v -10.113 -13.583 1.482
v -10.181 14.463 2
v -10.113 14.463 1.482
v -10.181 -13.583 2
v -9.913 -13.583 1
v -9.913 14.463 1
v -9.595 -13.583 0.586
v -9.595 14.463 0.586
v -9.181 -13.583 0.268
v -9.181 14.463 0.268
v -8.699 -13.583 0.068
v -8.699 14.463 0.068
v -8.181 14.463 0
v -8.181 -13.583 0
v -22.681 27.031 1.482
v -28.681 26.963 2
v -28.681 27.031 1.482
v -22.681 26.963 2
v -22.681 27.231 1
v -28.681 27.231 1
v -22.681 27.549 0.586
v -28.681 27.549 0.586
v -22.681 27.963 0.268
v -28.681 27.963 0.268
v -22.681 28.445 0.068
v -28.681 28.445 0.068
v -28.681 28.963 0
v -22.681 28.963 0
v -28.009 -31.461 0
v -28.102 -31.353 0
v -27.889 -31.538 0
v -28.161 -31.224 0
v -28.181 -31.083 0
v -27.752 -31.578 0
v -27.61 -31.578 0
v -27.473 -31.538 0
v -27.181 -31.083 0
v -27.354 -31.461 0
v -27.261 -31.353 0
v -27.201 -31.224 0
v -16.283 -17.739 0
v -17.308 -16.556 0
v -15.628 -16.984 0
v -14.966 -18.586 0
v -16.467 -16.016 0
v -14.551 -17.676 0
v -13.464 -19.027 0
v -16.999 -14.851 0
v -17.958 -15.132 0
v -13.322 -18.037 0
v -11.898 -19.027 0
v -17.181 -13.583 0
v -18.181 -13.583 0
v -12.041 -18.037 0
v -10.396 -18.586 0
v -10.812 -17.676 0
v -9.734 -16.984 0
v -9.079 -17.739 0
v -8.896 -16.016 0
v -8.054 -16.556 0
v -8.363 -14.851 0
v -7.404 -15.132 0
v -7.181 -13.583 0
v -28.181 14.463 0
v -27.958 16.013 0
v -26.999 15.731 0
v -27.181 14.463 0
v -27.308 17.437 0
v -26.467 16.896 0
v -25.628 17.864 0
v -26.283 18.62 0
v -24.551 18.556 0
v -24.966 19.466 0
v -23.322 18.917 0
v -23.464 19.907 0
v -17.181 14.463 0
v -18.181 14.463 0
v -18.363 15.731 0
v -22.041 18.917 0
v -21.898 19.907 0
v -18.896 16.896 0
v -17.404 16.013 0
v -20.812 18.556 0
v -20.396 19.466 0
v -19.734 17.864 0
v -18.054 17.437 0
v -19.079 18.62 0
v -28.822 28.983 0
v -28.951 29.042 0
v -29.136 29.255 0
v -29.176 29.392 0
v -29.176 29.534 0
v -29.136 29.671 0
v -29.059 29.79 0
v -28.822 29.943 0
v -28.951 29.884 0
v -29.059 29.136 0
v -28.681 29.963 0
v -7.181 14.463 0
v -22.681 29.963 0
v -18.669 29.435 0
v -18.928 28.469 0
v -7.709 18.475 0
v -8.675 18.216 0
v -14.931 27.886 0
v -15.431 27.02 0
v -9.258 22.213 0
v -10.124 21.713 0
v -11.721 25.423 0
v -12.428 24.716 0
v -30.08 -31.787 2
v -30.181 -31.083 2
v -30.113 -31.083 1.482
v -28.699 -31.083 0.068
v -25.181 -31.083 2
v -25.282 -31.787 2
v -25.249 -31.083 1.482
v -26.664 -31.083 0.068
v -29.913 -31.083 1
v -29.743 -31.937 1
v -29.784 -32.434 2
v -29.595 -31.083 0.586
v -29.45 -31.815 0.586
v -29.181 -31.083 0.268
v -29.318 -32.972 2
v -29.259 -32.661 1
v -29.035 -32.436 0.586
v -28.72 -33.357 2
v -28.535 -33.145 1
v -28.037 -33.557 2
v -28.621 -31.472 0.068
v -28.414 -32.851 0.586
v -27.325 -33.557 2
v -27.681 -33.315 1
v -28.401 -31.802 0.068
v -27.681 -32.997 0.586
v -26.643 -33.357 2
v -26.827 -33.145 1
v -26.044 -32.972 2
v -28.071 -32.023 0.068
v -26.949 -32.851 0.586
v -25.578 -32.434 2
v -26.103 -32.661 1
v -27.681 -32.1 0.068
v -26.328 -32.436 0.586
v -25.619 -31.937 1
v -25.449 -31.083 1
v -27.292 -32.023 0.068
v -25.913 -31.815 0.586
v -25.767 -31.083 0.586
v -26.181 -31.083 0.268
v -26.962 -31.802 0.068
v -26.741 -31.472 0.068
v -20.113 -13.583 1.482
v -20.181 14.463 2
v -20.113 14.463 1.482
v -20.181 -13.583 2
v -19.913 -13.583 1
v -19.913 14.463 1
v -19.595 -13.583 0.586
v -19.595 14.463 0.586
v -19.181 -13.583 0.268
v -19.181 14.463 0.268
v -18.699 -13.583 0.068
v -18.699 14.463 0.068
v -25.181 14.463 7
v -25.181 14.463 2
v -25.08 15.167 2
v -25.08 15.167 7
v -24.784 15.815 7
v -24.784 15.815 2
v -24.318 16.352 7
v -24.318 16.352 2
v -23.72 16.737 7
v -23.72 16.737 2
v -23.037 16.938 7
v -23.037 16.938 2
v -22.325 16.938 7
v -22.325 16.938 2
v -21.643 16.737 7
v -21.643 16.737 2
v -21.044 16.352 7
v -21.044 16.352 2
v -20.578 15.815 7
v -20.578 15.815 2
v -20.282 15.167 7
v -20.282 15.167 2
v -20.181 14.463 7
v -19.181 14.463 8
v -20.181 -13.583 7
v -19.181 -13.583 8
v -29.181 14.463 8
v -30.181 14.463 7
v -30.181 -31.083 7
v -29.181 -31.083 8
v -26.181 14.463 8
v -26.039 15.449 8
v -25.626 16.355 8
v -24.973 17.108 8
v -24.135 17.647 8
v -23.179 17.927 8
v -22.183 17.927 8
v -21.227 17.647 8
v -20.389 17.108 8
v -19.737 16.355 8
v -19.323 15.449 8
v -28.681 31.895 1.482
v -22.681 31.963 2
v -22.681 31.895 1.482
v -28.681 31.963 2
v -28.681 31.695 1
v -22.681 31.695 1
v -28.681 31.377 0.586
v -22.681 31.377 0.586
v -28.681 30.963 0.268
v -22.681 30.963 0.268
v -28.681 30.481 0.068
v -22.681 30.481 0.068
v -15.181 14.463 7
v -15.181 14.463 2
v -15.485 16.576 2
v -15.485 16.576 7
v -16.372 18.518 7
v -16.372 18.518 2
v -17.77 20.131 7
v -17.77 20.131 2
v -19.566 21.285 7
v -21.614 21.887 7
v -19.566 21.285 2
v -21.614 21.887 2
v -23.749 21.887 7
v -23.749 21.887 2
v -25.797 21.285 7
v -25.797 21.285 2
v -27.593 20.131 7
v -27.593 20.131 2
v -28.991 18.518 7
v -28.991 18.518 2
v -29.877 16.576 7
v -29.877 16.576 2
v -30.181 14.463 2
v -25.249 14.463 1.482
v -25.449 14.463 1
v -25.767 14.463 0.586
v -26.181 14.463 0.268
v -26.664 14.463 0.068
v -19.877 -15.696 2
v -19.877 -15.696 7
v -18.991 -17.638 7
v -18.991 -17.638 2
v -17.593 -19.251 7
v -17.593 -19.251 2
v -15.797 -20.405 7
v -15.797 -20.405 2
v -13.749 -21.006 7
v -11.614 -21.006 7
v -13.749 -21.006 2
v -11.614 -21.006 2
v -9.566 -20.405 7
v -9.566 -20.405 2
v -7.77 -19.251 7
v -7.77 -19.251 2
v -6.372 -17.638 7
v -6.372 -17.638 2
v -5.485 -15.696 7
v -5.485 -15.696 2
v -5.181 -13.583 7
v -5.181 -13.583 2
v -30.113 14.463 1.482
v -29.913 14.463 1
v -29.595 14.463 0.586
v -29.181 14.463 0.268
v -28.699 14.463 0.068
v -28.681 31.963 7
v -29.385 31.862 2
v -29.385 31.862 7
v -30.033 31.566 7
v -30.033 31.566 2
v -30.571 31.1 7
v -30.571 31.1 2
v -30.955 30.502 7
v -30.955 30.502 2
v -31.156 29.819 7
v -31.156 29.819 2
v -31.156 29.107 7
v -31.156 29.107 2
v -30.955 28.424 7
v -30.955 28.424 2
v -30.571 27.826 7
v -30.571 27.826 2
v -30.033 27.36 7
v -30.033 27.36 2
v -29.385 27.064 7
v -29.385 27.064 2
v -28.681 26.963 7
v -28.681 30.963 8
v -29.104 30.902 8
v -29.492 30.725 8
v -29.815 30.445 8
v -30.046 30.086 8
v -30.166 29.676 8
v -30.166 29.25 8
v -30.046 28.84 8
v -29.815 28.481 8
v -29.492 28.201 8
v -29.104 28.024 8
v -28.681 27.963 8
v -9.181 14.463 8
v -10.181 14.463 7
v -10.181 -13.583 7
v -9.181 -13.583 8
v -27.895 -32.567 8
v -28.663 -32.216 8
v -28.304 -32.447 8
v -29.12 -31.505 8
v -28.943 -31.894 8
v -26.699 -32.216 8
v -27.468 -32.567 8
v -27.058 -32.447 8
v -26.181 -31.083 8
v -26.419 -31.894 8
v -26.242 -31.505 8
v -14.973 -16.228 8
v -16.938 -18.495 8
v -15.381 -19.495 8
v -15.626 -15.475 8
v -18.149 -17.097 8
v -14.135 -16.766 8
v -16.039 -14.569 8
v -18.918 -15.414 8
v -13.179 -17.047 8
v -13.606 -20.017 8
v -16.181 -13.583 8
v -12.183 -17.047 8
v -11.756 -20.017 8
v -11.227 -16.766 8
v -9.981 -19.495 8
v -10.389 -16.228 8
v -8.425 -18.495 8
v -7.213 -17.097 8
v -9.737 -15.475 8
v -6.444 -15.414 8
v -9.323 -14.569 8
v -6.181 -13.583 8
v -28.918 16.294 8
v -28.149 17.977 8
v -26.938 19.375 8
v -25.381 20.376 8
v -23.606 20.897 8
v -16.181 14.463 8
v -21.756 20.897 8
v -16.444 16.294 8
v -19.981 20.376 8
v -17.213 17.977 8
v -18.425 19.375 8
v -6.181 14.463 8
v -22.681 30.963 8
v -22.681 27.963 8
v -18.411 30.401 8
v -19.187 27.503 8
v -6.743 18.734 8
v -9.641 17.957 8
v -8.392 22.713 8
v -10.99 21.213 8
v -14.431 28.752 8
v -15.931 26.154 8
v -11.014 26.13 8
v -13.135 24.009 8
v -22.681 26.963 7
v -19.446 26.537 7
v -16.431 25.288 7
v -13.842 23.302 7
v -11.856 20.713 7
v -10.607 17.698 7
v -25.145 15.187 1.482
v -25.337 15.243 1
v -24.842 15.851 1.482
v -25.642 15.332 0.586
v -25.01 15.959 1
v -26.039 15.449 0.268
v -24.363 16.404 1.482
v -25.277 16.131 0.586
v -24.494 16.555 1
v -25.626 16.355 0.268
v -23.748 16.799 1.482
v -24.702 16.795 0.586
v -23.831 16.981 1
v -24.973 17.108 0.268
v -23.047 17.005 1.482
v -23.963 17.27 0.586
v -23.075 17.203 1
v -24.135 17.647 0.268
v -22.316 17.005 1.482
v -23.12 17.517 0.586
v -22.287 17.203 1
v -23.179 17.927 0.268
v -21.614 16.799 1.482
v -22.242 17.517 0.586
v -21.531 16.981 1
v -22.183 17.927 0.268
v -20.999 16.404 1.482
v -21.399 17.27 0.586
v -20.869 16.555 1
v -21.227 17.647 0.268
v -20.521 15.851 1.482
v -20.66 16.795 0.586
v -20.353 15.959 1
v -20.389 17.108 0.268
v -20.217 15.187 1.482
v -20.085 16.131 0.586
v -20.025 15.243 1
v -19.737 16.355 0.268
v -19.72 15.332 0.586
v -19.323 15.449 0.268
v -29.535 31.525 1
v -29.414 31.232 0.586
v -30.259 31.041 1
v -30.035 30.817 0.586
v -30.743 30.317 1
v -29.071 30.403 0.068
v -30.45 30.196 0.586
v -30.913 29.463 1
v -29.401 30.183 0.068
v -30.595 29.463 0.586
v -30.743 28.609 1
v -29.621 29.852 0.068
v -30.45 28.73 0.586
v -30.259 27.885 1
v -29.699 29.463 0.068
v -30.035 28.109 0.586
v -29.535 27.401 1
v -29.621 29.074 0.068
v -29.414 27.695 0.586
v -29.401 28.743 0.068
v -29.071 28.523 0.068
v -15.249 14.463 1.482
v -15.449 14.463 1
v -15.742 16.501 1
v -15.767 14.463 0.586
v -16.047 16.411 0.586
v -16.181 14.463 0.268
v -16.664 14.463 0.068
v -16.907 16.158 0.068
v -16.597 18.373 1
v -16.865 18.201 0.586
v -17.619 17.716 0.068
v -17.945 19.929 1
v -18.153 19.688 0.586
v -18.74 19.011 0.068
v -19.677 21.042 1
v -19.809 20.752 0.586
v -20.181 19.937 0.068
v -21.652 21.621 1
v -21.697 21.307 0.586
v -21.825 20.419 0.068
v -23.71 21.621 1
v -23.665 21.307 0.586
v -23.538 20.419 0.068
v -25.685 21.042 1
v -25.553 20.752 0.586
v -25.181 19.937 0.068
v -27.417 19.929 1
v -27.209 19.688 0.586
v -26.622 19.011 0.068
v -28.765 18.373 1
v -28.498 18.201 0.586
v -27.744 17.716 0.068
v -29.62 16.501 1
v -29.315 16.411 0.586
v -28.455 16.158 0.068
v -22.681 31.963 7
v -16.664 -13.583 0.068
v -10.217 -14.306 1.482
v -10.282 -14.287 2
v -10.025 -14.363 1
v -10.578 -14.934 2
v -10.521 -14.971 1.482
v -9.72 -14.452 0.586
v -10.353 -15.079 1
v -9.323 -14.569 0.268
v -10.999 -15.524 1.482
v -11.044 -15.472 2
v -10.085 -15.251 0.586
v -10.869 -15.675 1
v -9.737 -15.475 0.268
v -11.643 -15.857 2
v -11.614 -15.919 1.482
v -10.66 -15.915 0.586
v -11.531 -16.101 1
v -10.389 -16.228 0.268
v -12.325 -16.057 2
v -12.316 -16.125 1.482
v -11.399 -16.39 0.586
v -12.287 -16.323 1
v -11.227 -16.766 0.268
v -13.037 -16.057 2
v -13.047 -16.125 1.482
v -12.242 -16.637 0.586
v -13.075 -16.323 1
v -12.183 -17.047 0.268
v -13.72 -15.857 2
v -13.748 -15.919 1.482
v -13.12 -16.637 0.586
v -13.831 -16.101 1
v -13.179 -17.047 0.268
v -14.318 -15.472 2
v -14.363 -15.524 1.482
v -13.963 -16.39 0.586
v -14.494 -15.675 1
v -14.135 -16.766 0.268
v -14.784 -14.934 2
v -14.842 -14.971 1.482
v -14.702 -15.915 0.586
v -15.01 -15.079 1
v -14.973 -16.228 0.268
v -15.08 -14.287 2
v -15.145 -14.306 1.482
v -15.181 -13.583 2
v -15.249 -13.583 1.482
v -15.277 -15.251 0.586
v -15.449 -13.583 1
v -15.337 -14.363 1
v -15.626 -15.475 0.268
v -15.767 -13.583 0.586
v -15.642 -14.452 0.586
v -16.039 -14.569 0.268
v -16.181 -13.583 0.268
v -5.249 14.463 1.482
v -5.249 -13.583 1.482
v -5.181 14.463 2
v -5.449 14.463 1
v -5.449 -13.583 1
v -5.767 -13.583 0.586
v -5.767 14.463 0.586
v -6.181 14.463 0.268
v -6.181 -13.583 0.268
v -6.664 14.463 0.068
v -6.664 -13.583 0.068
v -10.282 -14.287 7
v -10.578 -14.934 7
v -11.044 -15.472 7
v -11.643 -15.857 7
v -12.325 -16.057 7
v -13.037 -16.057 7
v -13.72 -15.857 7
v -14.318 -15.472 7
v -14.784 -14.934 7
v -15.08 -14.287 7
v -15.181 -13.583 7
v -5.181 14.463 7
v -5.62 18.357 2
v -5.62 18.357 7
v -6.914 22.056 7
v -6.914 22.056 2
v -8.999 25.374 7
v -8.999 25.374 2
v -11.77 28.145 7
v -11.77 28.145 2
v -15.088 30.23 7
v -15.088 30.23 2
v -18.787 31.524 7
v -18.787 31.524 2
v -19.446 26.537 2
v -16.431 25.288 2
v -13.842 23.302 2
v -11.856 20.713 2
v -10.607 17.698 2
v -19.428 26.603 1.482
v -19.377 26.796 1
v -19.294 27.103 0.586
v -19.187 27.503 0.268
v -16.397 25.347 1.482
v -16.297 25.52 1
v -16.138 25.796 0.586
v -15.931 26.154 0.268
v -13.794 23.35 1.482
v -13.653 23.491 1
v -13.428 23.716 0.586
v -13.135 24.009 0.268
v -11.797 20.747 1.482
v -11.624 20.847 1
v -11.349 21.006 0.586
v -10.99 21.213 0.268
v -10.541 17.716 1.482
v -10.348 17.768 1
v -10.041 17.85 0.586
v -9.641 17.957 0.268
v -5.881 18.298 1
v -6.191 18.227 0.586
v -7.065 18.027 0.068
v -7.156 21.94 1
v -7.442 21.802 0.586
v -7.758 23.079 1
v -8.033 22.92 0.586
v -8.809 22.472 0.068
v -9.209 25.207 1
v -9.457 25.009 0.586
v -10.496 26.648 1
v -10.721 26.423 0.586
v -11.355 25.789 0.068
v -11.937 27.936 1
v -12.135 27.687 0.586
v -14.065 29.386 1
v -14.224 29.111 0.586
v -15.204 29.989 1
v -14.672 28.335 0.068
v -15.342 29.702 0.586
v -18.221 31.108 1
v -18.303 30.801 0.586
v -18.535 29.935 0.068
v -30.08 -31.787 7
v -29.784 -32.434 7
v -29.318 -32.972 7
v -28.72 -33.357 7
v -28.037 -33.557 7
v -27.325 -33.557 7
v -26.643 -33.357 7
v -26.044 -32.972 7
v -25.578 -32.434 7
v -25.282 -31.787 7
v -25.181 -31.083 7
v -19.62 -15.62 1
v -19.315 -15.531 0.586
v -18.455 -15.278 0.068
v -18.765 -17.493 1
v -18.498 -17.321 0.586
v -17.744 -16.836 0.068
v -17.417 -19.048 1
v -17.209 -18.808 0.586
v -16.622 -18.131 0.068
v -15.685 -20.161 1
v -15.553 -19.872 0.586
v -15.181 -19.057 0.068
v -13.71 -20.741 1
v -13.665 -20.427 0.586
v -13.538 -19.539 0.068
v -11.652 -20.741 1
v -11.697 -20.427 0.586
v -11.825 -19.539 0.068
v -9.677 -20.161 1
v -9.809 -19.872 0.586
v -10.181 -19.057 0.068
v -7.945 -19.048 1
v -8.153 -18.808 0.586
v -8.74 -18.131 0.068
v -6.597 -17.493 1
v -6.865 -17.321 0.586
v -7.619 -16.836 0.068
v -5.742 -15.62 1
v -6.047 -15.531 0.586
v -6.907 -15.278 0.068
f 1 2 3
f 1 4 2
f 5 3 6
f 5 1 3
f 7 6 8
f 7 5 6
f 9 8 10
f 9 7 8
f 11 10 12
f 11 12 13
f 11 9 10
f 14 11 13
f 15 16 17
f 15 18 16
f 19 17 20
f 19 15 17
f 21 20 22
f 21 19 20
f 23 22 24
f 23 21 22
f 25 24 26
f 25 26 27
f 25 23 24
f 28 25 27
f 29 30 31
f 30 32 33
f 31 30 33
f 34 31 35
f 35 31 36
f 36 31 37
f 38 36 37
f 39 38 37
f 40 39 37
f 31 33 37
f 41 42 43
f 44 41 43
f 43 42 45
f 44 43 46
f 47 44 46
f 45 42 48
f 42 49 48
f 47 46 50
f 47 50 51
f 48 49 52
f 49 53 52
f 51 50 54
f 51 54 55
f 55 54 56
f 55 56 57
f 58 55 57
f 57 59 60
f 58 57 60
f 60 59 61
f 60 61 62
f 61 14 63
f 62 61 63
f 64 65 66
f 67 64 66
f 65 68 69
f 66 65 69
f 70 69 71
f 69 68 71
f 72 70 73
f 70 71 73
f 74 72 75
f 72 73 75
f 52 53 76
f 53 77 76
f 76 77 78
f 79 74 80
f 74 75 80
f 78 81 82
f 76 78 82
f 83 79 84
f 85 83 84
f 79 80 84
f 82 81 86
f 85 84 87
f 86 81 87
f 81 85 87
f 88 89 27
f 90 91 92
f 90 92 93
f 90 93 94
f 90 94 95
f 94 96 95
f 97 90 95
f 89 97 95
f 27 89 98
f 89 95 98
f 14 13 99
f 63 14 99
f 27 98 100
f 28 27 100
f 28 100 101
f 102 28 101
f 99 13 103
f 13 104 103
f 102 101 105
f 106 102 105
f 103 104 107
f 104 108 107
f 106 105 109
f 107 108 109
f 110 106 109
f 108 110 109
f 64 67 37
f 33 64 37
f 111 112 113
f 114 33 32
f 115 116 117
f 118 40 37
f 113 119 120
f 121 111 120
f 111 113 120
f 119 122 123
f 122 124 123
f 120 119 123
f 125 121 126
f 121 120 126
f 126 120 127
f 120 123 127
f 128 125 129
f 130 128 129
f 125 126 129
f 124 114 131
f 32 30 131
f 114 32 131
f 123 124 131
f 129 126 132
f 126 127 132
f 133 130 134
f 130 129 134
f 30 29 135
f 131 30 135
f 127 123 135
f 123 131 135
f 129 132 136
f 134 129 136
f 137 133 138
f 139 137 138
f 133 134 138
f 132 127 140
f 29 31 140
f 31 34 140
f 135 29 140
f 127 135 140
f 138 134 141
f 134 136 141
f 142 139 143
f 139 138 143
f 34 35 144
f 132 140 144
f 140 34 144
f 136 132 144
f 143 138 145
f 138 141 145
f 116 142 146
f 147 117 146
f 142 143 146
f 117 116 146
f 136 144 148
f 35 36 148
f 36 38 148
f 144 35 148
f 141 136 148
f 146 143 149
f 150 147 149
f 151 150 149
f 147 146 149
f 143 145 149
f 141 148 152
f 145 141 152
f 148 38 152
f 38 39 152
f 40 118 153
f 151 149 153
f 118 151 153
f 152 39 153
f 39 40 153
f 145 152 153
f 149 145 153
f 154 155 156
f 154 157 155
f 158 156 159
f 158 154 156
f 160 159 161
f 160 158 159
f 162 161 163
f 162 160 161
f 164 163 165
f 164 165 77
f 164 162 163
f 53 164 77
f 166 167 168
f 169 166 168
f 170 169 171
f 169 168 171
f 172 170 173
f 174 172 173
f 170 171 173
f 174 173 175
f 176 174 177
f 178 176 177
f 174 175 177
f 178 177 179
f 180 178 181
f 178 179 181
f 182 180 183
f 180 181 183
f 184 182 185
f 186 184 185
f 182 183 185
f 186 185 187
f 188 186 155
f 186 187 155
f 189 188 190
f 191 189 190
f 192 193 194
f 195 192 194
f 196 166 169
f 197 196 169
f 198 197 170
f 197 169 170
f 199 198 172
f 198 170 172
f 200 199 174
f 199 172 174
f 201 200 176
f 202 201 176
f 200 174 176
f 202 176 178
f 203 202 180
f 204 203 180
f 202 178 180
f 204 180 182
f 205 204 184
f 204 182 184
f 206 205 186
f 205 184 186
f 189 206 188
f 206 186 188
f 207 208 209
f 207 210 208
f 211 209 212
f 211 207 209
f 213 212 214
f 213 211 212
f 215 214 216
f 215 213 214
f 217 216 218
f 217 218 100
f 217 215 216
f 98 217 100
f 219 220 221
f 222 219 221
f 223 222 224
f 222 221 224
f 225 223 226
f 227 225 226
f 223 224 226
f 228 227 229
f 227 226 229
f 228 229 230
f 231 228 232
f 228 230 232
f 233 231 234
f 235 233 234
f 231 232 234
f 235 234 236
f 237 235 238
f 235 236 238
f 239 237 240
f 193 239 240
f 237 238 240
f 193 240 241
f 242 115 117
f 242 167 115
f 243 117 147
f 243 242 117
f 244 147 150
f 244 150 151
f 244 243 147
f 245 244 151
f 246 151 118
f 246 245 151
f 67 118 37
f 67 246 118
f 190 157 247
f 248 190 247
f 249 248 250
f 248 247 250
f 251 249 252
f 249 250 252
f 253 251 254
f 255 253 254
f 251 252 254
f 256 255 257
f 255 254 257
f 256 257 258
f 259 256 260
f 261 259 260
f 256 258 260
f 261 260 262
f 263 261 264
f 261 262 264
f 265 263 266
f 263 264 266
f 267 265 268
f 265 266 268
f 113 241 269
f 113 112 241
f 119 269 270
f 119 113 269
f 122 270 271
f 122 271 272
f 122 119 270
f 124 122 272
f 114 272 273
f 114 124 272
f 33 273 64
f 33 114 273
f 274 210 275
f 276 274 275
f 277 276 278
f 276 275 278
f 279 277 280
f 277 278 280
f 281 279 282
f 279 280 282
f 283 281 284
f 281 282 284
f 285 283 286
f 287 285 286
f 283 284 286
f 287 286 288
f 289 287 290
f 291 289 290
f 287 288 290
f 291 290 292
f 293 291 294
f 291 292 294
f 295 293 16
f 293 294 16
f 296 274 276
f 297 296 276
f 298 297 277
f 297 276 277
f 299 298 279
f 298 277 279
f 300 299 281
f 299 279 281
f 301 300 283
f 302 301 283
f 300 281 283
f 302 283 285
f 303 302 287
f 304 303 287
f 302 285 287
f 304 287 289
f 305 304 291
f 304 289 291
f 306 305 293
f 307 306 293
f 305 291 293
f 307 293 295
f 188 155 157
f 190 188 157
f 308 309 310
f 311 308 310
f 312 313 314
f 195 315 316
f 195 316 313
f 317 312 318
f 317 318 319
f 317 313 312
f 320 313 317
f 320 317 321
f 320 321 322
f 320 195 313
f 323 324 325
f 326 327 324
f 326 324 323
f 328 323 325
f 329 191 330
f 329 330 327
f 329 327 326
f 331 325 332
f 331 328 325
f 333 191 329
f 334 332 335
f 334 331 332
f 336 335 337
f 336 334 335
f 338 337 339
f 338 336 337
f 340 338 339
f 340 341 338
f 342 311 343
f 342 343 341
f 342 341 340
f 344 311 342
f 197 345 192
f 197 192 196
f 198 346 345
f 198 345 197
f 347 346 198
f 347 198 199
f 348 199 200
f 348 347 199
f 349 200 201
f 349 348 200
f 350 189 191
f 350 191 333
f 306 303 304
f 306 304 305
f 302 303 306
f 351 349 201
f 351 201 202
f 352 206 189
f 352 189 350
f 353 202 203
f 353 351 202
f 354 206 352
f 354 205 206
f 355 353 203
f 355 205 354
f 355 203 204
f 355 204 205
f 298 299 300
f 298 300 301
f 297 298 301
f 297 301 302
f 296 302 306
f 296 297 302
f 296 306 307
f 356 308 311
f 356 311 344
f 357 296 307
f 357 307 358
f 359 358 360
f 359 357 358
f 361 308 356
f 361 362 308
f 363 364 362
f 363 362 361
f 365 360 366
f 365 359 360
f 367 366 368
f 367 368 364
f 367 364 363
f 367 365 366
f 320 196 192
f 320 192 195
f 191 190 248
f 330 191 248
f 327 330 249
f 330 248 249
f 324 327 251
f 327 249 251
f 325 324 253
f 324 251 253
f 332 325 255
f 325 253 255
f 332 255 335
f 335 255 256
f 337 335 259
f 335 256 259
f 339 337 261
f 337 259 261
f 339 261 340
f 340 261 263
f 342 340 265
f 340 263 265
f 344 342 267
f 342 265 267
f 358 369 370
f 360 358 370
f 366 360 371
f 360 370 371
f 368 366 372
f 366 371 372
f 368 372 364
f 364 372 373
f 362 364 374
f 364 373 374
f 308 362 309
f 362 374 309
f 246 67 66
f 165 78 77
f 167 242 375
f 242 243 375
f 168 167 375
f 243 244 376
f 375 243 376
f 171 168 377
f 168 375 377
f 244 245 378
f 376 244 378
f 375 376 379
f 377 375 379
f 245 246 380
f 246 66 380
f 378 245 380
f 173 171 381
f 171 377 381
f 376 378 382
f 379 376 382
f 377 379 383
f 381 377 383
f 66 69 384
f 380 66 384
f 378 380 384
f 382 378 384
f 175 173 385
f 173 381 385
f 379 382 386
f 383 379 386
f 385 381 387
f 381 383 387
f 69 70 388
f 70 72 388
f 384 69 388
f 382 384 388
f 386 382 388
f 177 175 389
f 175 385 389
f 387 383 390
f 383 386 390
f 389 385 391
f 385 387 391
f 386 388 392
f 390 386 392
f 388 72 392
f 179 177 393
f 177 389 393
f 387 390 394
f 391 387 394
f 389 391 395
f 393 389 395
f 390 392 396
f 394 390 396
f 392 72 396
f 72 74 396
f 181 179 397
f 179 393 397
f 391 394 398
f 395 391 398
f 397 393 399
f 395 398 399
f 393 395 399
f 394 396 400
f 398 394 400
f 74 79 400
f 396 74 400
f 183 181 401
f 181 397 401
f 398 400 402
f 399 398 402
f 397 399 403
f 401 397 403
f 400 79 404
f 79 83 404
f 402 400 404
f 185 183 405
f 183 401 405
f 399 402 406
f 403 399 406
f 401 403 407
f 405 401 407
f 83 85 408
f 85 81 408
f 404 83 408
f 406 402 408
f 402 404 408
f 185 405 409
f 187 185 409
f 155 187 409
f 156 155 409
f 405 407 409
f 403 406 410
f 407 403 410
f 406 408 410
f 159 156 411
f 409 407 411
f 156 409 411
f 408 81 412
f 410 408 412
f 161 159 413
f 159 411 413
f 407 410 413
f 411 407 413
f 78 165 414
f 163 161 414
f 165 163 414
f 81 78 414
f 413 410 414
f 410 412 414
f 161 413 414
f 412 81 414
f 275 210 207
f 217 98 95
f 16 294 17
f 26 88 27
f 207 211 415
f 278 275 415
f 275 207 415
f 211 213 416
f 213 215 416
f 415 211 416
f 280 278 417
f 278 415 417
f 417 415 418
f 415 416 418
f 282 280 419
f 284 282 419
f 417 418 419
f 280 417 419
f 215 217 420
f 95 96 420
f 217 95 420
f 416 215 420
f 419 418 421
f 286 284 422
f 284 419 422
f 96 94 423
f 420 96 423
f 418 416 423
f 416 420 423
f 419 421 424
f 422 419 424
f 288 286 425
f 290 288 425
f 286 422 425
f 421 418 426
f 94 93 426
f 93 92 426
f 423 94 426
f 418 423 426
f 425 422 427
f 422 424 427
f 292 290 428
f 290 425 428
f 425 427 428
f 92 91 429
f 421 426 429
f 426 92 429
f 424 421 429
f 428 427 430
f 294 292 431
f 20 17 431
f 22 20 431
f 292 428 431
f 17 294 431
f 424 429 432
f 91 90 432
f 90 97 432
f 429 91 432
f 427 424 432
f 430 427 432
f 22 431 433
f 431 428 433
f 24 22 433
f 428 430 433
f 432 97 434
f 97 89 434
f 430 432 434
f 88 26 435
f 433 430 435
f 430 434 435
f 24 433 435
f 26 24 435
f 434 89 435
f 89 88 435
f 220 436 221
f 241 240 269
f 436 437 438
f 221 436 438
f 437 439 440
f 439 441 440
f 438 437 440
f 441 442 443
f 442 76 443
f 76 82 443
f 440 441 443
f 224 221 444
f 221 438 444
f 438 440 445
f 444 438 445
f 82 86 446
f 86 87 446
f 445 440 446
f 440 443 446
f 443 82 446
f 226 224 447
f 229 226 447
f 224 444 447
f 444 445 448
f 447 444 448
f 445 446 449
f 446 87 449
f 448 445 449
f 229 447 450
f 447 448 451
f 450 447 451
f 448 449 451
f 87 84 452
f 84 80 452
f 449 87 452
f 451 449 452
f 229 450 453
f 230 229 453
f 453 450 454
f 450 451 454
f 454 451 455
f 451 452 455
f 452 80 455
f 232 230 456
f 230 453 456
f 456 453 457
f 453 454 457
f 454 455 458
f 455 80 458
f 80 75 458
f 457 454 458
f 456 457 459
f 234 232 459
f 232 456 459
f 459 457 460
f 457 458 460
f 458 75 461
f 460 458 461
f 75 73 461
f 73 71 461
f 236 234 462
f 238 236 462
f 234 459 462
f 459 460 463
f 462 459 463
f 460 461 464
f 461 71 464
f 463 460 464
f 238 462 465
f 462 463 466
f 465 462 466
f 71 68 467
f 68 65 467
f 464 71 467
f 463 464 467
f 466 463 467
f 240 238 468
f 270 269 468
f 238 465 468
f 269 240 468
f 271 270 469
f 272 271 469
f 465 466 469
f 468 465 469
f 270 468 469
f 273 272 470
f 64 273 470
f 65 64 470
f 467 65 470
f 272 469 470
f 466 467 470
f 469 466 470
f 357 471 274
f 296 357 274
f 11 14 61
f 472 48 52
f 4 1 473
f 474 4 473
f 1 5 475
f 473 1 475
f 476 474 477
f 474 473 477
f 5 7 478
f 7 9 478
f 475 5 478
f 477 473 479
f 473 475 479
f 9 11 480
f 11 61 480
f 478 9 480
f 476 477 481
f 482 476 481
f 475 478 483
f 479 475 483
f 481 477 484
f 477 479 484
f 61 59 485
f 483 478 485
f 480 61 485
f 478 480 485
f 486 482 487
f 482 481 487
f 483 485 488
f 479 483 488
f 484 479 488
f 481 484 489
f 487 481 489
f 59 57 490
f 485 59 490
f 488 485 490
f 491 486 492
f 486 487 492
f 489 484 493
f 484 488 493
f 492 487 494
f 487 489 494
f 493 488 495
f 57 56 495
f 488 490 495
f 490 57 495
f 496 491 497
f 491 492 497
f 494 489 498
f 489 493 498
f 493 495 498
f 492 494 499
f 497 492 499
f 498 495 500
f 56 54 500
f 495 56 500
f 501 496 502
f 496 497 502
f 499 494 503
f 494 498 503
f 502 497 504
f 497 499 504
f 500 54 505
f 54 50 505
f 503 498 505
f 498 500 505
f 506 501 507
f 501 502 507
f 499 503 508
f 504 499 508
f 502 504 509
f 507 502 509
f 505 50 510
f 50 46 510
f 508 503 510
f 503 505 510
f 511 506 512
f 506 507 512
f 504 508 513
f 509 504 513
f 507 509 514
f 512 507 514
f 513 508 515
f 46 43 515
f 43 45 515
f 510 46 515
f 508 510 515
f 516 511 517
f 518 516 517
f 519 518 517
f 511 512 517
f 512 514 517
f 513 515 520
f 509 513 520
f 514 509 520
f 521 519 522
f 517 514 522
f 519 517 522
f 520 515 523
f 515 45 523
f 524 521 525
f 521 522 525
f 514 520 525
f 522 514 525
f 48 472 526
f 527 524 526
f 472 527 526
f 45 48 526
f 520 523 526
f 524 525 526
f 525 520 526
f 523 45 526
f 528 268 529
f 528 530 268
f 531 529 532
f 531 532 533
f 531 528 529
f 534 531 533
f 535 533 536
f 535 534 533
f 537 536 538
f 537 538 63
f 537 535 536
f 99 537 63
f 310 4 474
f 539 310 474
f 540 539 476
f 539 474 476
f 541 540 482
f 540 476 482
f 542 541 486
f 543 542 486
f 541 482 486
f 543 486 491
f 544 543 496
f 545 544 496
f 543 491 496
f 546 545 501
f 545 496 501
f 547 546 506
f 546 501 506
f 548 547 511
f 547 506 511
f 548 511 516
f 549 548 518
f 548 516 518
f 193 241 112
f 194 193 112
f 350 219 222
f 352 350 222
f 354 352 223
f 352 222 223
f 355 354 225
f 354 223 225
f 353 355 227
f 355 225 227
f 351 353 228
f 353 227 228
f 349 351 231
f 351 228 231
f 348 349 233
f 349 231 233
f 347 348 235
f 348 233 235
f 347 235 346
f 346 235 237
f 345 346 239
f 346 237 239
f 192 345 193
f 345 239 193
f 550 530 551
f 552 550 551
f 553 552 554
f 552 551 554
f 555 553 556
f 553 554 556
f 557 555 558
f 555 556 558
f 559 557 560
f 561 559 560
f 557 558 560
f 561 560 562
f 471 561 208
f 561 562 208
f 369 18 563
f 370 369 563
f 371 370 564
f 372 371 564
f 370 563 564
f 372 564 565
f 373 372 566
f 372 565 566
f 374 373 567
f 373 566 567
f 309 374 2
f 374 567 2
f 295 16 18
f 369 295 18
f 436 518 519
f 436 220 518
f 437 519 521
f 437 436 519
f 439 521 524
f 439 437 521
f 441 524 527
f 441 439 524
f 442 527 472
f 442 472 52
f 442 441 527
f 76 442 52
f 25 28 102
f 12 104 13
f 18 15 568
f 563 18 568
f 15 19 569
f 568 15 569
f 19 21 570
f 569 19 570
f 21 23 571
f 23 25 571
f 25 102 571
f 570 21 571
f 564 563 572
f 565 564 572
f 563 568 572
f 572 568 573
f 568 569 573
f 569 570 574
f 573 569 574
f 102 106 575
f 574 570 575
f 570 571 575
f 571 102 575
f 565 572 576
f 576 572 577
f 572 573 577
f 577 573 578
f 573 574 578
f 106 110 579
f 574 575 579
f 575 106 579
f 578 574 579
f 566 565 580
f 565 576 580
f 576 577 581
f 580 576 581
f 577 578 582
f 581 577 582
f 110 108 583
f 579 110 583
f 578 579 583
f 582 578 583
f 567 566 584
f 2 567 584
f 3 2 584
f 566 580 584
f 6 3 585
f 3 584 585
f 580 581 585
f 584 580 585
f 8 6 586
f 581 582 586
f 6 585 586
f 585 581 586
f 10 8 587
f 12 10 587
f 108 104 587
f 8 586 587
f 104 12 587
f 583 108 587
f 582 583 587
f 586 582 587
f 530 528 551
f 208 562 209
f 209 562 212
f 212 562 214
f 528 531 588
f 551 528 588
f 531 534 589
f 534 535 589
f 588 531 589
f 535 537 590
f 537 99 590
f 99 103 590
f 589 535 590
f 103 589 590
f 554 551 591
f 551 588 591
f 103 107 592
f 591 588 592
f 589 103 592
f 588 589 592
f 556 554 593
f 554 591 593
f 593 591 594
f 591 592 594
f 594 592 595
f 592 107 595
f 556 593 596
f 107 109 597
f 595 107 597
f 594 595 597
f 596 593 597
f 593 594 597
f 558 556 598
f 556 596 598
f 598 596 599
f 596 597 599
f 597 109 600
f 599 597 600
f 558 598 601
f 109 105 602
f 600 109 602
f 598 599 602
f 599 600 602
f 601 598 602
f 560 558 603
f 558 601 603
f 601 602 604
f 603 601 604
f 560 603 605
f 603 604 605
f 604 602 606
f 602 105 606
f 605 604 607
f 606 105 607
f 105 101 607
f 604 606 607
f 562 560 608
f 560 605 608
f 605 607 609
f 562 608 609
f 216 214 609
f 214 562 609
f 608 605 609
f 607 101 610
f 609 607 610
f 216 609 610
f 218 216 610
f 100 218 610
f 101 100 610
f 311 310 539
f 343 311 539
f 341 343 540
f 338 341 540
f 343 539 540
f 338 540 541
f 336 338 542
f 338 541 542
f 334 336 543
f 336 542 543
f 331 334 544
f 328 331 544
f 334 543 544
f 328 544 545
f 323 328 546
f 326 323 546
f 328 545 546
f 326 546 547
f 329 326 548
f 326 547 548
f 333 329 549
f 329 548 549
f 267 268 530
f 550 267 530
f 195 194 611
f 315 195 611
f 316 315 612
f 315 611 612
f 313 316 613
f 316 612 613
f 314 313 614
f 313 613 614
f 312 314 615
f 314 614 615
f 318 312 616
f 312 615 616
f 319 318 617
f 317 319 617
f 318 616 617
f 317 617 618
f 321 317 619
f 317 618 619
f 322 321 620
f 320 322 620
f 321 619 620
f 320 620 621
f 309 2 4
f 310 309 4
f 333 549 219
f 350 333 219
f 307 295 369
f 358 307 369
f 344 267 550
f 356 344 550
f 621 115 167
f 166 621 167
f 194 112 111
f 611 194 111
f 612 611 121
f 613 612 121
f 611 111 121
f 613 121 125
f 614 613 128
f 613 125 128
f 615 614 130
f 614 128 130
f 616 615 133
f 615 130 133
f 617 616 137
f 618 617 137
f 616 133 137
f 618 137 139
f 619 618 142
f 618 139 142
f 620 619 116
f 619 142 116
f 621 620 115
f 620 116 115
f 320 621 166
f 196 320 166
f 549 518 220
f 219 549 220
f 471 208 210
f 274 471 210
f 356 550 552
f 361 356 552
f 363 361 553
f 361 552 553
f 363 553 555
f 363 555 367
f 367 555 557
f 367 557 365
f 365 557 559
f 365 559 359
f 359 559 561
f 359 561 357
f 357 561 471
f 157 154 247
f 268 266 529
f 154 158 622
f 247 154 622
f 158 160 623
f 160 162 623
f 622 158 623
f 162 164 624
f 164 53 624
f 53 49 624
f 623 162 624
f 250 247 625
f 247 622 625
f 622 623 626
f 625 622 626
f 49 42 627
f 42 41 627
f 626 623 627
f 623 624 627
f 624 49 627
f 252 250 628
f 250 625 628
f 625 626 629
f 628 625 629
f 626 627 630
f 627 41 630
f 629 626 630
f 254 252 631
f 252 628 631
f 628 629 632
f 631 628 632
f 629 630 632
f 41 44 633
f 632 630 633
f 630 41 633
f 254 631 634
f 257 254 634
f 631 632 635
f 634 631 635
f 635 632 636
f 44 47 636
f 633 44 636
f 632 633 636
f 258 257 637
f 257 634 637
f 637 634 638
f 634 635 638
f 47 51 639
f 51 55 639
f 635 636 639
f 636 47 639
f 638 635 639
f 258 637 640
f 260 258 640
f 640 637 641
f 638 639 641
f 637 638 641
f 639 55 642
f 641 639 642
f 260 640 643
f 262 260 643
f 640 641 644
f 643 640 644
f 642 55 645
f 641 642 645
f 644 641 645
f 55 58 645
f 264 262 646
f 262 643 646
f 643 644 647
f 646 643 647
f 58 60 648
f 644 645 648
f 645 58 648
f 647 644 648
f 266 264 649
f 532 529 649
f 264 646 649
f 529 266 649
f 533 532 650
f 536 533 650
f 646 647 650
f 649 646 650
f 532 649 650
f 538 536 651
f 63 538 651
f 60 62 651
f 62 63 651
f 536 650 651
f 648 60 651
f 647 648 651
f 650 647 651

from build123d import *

# Parameters (mm, degrees)
F1_DEPTH = 8
F2_R     = 2
F3_SIZE  = 1


with BuildPart() as f1:
    # F0 (on Top) → F1 (new body)
    with BuildSketch(Plane.XY):
        with BuildLine():
            ThreePointArc((-20.181158, -13.582748), (-18.804883, -9.252621), (-15.181158, -6.51168))
            Line((-15.181158, -6.51168), (-15.181158, 14.463018))
            ThreePointArc((-15.181158, 14.463018), (-22.681158, 21.963018), (-30.181158, 14.463018))
            Line((-30.181158, 14.463018), (-30.181158, -16.082748))
            Line((-30.181158, -16.082748), (-30.181158, -31.082748))
            ThreePointArc((-30.181158, -31.082748), (-27.681158, -33.582748), (-25.181158, -31.082748))
            Line((-25.181158, -31.082748), (-25.181158, -16.082748))
            Line((-25.181158, -16.082748), (-25.181158, 14.463018))
            ThreePointArc((-25.181158, 14.463018), (-22.681158, 16.963018), (-20.181158, 14.463018))
            Line((-20.181158, 14.463018), (-20.181158, -13.582748))
        make_face()
        with BuildLine():
            Line((-10.181158, 14.463018), (-10.181158, -6.51168))
            ThreePointArc((-10.181158, -6.51168), (-6.557434, -9.252621), (-5.181158, -13.582748))
            Line((-5.181158, -13.582748), (-5.181158, 14.463018))
            ThreePointArc((-5.181158, 14.463018), (-10.306789, 26.837386), (-22.681158, 31.963018))
            Line((-22.681158, 31.963018), (-28.681158, 31.963018))
            ThreePointArc((-28.681158, 31.963018), (-31.181158, 29.463018), (-28.681158, 26.963018))
            Line((-28.681158, 26.963018), (-22.681158, 26.963018))
            ThreePointArc((-22.681158, 26.963018), (-13.842323, 23.301852), (-10.181158, 14.463018))
        make_face()
        with BuildLine():
            ThreePointArc((-10.181158, -13.582748), (-12.681158, -16.082748), (-15.181158, -13.582748))
            Line((-15.181158, -13.582748), (-15.181158, -6.51168))
            ThreePointArc((-15.181158, -6.51168), (-18.804883, -9.252621), (-20.181158, -13.582748))
            ThreePointArc((-20.181158, -13.582748), (-12.681158, -21.082748), (-5.181158, -13.582748))
            ThreePointArc((-5.181158, -13.582748), (-6.557434, -9.252621), (-10.181158, -6.51168))
            Line((-10.181158, -6.51168), (-10.181158, -13.582748))
        make_face()
    extrude(amount=F1_DEPTH)

    # F2
    f2_edges = [f1.edges().sort_by_distance(p)[0] for p in [
        (-5.181158, 0.440135, 0),
    ]]
    fillet(f2_edges, radius=F2_R)

    # F3
    f3_edges = [f1.edges().sort_by_distance(p)[0] for p in [
        (-20.181158, 0.440135, 8),
    ]]
    chamfer(f3_edges, length=F3_SIZE)


solid = f1.part
